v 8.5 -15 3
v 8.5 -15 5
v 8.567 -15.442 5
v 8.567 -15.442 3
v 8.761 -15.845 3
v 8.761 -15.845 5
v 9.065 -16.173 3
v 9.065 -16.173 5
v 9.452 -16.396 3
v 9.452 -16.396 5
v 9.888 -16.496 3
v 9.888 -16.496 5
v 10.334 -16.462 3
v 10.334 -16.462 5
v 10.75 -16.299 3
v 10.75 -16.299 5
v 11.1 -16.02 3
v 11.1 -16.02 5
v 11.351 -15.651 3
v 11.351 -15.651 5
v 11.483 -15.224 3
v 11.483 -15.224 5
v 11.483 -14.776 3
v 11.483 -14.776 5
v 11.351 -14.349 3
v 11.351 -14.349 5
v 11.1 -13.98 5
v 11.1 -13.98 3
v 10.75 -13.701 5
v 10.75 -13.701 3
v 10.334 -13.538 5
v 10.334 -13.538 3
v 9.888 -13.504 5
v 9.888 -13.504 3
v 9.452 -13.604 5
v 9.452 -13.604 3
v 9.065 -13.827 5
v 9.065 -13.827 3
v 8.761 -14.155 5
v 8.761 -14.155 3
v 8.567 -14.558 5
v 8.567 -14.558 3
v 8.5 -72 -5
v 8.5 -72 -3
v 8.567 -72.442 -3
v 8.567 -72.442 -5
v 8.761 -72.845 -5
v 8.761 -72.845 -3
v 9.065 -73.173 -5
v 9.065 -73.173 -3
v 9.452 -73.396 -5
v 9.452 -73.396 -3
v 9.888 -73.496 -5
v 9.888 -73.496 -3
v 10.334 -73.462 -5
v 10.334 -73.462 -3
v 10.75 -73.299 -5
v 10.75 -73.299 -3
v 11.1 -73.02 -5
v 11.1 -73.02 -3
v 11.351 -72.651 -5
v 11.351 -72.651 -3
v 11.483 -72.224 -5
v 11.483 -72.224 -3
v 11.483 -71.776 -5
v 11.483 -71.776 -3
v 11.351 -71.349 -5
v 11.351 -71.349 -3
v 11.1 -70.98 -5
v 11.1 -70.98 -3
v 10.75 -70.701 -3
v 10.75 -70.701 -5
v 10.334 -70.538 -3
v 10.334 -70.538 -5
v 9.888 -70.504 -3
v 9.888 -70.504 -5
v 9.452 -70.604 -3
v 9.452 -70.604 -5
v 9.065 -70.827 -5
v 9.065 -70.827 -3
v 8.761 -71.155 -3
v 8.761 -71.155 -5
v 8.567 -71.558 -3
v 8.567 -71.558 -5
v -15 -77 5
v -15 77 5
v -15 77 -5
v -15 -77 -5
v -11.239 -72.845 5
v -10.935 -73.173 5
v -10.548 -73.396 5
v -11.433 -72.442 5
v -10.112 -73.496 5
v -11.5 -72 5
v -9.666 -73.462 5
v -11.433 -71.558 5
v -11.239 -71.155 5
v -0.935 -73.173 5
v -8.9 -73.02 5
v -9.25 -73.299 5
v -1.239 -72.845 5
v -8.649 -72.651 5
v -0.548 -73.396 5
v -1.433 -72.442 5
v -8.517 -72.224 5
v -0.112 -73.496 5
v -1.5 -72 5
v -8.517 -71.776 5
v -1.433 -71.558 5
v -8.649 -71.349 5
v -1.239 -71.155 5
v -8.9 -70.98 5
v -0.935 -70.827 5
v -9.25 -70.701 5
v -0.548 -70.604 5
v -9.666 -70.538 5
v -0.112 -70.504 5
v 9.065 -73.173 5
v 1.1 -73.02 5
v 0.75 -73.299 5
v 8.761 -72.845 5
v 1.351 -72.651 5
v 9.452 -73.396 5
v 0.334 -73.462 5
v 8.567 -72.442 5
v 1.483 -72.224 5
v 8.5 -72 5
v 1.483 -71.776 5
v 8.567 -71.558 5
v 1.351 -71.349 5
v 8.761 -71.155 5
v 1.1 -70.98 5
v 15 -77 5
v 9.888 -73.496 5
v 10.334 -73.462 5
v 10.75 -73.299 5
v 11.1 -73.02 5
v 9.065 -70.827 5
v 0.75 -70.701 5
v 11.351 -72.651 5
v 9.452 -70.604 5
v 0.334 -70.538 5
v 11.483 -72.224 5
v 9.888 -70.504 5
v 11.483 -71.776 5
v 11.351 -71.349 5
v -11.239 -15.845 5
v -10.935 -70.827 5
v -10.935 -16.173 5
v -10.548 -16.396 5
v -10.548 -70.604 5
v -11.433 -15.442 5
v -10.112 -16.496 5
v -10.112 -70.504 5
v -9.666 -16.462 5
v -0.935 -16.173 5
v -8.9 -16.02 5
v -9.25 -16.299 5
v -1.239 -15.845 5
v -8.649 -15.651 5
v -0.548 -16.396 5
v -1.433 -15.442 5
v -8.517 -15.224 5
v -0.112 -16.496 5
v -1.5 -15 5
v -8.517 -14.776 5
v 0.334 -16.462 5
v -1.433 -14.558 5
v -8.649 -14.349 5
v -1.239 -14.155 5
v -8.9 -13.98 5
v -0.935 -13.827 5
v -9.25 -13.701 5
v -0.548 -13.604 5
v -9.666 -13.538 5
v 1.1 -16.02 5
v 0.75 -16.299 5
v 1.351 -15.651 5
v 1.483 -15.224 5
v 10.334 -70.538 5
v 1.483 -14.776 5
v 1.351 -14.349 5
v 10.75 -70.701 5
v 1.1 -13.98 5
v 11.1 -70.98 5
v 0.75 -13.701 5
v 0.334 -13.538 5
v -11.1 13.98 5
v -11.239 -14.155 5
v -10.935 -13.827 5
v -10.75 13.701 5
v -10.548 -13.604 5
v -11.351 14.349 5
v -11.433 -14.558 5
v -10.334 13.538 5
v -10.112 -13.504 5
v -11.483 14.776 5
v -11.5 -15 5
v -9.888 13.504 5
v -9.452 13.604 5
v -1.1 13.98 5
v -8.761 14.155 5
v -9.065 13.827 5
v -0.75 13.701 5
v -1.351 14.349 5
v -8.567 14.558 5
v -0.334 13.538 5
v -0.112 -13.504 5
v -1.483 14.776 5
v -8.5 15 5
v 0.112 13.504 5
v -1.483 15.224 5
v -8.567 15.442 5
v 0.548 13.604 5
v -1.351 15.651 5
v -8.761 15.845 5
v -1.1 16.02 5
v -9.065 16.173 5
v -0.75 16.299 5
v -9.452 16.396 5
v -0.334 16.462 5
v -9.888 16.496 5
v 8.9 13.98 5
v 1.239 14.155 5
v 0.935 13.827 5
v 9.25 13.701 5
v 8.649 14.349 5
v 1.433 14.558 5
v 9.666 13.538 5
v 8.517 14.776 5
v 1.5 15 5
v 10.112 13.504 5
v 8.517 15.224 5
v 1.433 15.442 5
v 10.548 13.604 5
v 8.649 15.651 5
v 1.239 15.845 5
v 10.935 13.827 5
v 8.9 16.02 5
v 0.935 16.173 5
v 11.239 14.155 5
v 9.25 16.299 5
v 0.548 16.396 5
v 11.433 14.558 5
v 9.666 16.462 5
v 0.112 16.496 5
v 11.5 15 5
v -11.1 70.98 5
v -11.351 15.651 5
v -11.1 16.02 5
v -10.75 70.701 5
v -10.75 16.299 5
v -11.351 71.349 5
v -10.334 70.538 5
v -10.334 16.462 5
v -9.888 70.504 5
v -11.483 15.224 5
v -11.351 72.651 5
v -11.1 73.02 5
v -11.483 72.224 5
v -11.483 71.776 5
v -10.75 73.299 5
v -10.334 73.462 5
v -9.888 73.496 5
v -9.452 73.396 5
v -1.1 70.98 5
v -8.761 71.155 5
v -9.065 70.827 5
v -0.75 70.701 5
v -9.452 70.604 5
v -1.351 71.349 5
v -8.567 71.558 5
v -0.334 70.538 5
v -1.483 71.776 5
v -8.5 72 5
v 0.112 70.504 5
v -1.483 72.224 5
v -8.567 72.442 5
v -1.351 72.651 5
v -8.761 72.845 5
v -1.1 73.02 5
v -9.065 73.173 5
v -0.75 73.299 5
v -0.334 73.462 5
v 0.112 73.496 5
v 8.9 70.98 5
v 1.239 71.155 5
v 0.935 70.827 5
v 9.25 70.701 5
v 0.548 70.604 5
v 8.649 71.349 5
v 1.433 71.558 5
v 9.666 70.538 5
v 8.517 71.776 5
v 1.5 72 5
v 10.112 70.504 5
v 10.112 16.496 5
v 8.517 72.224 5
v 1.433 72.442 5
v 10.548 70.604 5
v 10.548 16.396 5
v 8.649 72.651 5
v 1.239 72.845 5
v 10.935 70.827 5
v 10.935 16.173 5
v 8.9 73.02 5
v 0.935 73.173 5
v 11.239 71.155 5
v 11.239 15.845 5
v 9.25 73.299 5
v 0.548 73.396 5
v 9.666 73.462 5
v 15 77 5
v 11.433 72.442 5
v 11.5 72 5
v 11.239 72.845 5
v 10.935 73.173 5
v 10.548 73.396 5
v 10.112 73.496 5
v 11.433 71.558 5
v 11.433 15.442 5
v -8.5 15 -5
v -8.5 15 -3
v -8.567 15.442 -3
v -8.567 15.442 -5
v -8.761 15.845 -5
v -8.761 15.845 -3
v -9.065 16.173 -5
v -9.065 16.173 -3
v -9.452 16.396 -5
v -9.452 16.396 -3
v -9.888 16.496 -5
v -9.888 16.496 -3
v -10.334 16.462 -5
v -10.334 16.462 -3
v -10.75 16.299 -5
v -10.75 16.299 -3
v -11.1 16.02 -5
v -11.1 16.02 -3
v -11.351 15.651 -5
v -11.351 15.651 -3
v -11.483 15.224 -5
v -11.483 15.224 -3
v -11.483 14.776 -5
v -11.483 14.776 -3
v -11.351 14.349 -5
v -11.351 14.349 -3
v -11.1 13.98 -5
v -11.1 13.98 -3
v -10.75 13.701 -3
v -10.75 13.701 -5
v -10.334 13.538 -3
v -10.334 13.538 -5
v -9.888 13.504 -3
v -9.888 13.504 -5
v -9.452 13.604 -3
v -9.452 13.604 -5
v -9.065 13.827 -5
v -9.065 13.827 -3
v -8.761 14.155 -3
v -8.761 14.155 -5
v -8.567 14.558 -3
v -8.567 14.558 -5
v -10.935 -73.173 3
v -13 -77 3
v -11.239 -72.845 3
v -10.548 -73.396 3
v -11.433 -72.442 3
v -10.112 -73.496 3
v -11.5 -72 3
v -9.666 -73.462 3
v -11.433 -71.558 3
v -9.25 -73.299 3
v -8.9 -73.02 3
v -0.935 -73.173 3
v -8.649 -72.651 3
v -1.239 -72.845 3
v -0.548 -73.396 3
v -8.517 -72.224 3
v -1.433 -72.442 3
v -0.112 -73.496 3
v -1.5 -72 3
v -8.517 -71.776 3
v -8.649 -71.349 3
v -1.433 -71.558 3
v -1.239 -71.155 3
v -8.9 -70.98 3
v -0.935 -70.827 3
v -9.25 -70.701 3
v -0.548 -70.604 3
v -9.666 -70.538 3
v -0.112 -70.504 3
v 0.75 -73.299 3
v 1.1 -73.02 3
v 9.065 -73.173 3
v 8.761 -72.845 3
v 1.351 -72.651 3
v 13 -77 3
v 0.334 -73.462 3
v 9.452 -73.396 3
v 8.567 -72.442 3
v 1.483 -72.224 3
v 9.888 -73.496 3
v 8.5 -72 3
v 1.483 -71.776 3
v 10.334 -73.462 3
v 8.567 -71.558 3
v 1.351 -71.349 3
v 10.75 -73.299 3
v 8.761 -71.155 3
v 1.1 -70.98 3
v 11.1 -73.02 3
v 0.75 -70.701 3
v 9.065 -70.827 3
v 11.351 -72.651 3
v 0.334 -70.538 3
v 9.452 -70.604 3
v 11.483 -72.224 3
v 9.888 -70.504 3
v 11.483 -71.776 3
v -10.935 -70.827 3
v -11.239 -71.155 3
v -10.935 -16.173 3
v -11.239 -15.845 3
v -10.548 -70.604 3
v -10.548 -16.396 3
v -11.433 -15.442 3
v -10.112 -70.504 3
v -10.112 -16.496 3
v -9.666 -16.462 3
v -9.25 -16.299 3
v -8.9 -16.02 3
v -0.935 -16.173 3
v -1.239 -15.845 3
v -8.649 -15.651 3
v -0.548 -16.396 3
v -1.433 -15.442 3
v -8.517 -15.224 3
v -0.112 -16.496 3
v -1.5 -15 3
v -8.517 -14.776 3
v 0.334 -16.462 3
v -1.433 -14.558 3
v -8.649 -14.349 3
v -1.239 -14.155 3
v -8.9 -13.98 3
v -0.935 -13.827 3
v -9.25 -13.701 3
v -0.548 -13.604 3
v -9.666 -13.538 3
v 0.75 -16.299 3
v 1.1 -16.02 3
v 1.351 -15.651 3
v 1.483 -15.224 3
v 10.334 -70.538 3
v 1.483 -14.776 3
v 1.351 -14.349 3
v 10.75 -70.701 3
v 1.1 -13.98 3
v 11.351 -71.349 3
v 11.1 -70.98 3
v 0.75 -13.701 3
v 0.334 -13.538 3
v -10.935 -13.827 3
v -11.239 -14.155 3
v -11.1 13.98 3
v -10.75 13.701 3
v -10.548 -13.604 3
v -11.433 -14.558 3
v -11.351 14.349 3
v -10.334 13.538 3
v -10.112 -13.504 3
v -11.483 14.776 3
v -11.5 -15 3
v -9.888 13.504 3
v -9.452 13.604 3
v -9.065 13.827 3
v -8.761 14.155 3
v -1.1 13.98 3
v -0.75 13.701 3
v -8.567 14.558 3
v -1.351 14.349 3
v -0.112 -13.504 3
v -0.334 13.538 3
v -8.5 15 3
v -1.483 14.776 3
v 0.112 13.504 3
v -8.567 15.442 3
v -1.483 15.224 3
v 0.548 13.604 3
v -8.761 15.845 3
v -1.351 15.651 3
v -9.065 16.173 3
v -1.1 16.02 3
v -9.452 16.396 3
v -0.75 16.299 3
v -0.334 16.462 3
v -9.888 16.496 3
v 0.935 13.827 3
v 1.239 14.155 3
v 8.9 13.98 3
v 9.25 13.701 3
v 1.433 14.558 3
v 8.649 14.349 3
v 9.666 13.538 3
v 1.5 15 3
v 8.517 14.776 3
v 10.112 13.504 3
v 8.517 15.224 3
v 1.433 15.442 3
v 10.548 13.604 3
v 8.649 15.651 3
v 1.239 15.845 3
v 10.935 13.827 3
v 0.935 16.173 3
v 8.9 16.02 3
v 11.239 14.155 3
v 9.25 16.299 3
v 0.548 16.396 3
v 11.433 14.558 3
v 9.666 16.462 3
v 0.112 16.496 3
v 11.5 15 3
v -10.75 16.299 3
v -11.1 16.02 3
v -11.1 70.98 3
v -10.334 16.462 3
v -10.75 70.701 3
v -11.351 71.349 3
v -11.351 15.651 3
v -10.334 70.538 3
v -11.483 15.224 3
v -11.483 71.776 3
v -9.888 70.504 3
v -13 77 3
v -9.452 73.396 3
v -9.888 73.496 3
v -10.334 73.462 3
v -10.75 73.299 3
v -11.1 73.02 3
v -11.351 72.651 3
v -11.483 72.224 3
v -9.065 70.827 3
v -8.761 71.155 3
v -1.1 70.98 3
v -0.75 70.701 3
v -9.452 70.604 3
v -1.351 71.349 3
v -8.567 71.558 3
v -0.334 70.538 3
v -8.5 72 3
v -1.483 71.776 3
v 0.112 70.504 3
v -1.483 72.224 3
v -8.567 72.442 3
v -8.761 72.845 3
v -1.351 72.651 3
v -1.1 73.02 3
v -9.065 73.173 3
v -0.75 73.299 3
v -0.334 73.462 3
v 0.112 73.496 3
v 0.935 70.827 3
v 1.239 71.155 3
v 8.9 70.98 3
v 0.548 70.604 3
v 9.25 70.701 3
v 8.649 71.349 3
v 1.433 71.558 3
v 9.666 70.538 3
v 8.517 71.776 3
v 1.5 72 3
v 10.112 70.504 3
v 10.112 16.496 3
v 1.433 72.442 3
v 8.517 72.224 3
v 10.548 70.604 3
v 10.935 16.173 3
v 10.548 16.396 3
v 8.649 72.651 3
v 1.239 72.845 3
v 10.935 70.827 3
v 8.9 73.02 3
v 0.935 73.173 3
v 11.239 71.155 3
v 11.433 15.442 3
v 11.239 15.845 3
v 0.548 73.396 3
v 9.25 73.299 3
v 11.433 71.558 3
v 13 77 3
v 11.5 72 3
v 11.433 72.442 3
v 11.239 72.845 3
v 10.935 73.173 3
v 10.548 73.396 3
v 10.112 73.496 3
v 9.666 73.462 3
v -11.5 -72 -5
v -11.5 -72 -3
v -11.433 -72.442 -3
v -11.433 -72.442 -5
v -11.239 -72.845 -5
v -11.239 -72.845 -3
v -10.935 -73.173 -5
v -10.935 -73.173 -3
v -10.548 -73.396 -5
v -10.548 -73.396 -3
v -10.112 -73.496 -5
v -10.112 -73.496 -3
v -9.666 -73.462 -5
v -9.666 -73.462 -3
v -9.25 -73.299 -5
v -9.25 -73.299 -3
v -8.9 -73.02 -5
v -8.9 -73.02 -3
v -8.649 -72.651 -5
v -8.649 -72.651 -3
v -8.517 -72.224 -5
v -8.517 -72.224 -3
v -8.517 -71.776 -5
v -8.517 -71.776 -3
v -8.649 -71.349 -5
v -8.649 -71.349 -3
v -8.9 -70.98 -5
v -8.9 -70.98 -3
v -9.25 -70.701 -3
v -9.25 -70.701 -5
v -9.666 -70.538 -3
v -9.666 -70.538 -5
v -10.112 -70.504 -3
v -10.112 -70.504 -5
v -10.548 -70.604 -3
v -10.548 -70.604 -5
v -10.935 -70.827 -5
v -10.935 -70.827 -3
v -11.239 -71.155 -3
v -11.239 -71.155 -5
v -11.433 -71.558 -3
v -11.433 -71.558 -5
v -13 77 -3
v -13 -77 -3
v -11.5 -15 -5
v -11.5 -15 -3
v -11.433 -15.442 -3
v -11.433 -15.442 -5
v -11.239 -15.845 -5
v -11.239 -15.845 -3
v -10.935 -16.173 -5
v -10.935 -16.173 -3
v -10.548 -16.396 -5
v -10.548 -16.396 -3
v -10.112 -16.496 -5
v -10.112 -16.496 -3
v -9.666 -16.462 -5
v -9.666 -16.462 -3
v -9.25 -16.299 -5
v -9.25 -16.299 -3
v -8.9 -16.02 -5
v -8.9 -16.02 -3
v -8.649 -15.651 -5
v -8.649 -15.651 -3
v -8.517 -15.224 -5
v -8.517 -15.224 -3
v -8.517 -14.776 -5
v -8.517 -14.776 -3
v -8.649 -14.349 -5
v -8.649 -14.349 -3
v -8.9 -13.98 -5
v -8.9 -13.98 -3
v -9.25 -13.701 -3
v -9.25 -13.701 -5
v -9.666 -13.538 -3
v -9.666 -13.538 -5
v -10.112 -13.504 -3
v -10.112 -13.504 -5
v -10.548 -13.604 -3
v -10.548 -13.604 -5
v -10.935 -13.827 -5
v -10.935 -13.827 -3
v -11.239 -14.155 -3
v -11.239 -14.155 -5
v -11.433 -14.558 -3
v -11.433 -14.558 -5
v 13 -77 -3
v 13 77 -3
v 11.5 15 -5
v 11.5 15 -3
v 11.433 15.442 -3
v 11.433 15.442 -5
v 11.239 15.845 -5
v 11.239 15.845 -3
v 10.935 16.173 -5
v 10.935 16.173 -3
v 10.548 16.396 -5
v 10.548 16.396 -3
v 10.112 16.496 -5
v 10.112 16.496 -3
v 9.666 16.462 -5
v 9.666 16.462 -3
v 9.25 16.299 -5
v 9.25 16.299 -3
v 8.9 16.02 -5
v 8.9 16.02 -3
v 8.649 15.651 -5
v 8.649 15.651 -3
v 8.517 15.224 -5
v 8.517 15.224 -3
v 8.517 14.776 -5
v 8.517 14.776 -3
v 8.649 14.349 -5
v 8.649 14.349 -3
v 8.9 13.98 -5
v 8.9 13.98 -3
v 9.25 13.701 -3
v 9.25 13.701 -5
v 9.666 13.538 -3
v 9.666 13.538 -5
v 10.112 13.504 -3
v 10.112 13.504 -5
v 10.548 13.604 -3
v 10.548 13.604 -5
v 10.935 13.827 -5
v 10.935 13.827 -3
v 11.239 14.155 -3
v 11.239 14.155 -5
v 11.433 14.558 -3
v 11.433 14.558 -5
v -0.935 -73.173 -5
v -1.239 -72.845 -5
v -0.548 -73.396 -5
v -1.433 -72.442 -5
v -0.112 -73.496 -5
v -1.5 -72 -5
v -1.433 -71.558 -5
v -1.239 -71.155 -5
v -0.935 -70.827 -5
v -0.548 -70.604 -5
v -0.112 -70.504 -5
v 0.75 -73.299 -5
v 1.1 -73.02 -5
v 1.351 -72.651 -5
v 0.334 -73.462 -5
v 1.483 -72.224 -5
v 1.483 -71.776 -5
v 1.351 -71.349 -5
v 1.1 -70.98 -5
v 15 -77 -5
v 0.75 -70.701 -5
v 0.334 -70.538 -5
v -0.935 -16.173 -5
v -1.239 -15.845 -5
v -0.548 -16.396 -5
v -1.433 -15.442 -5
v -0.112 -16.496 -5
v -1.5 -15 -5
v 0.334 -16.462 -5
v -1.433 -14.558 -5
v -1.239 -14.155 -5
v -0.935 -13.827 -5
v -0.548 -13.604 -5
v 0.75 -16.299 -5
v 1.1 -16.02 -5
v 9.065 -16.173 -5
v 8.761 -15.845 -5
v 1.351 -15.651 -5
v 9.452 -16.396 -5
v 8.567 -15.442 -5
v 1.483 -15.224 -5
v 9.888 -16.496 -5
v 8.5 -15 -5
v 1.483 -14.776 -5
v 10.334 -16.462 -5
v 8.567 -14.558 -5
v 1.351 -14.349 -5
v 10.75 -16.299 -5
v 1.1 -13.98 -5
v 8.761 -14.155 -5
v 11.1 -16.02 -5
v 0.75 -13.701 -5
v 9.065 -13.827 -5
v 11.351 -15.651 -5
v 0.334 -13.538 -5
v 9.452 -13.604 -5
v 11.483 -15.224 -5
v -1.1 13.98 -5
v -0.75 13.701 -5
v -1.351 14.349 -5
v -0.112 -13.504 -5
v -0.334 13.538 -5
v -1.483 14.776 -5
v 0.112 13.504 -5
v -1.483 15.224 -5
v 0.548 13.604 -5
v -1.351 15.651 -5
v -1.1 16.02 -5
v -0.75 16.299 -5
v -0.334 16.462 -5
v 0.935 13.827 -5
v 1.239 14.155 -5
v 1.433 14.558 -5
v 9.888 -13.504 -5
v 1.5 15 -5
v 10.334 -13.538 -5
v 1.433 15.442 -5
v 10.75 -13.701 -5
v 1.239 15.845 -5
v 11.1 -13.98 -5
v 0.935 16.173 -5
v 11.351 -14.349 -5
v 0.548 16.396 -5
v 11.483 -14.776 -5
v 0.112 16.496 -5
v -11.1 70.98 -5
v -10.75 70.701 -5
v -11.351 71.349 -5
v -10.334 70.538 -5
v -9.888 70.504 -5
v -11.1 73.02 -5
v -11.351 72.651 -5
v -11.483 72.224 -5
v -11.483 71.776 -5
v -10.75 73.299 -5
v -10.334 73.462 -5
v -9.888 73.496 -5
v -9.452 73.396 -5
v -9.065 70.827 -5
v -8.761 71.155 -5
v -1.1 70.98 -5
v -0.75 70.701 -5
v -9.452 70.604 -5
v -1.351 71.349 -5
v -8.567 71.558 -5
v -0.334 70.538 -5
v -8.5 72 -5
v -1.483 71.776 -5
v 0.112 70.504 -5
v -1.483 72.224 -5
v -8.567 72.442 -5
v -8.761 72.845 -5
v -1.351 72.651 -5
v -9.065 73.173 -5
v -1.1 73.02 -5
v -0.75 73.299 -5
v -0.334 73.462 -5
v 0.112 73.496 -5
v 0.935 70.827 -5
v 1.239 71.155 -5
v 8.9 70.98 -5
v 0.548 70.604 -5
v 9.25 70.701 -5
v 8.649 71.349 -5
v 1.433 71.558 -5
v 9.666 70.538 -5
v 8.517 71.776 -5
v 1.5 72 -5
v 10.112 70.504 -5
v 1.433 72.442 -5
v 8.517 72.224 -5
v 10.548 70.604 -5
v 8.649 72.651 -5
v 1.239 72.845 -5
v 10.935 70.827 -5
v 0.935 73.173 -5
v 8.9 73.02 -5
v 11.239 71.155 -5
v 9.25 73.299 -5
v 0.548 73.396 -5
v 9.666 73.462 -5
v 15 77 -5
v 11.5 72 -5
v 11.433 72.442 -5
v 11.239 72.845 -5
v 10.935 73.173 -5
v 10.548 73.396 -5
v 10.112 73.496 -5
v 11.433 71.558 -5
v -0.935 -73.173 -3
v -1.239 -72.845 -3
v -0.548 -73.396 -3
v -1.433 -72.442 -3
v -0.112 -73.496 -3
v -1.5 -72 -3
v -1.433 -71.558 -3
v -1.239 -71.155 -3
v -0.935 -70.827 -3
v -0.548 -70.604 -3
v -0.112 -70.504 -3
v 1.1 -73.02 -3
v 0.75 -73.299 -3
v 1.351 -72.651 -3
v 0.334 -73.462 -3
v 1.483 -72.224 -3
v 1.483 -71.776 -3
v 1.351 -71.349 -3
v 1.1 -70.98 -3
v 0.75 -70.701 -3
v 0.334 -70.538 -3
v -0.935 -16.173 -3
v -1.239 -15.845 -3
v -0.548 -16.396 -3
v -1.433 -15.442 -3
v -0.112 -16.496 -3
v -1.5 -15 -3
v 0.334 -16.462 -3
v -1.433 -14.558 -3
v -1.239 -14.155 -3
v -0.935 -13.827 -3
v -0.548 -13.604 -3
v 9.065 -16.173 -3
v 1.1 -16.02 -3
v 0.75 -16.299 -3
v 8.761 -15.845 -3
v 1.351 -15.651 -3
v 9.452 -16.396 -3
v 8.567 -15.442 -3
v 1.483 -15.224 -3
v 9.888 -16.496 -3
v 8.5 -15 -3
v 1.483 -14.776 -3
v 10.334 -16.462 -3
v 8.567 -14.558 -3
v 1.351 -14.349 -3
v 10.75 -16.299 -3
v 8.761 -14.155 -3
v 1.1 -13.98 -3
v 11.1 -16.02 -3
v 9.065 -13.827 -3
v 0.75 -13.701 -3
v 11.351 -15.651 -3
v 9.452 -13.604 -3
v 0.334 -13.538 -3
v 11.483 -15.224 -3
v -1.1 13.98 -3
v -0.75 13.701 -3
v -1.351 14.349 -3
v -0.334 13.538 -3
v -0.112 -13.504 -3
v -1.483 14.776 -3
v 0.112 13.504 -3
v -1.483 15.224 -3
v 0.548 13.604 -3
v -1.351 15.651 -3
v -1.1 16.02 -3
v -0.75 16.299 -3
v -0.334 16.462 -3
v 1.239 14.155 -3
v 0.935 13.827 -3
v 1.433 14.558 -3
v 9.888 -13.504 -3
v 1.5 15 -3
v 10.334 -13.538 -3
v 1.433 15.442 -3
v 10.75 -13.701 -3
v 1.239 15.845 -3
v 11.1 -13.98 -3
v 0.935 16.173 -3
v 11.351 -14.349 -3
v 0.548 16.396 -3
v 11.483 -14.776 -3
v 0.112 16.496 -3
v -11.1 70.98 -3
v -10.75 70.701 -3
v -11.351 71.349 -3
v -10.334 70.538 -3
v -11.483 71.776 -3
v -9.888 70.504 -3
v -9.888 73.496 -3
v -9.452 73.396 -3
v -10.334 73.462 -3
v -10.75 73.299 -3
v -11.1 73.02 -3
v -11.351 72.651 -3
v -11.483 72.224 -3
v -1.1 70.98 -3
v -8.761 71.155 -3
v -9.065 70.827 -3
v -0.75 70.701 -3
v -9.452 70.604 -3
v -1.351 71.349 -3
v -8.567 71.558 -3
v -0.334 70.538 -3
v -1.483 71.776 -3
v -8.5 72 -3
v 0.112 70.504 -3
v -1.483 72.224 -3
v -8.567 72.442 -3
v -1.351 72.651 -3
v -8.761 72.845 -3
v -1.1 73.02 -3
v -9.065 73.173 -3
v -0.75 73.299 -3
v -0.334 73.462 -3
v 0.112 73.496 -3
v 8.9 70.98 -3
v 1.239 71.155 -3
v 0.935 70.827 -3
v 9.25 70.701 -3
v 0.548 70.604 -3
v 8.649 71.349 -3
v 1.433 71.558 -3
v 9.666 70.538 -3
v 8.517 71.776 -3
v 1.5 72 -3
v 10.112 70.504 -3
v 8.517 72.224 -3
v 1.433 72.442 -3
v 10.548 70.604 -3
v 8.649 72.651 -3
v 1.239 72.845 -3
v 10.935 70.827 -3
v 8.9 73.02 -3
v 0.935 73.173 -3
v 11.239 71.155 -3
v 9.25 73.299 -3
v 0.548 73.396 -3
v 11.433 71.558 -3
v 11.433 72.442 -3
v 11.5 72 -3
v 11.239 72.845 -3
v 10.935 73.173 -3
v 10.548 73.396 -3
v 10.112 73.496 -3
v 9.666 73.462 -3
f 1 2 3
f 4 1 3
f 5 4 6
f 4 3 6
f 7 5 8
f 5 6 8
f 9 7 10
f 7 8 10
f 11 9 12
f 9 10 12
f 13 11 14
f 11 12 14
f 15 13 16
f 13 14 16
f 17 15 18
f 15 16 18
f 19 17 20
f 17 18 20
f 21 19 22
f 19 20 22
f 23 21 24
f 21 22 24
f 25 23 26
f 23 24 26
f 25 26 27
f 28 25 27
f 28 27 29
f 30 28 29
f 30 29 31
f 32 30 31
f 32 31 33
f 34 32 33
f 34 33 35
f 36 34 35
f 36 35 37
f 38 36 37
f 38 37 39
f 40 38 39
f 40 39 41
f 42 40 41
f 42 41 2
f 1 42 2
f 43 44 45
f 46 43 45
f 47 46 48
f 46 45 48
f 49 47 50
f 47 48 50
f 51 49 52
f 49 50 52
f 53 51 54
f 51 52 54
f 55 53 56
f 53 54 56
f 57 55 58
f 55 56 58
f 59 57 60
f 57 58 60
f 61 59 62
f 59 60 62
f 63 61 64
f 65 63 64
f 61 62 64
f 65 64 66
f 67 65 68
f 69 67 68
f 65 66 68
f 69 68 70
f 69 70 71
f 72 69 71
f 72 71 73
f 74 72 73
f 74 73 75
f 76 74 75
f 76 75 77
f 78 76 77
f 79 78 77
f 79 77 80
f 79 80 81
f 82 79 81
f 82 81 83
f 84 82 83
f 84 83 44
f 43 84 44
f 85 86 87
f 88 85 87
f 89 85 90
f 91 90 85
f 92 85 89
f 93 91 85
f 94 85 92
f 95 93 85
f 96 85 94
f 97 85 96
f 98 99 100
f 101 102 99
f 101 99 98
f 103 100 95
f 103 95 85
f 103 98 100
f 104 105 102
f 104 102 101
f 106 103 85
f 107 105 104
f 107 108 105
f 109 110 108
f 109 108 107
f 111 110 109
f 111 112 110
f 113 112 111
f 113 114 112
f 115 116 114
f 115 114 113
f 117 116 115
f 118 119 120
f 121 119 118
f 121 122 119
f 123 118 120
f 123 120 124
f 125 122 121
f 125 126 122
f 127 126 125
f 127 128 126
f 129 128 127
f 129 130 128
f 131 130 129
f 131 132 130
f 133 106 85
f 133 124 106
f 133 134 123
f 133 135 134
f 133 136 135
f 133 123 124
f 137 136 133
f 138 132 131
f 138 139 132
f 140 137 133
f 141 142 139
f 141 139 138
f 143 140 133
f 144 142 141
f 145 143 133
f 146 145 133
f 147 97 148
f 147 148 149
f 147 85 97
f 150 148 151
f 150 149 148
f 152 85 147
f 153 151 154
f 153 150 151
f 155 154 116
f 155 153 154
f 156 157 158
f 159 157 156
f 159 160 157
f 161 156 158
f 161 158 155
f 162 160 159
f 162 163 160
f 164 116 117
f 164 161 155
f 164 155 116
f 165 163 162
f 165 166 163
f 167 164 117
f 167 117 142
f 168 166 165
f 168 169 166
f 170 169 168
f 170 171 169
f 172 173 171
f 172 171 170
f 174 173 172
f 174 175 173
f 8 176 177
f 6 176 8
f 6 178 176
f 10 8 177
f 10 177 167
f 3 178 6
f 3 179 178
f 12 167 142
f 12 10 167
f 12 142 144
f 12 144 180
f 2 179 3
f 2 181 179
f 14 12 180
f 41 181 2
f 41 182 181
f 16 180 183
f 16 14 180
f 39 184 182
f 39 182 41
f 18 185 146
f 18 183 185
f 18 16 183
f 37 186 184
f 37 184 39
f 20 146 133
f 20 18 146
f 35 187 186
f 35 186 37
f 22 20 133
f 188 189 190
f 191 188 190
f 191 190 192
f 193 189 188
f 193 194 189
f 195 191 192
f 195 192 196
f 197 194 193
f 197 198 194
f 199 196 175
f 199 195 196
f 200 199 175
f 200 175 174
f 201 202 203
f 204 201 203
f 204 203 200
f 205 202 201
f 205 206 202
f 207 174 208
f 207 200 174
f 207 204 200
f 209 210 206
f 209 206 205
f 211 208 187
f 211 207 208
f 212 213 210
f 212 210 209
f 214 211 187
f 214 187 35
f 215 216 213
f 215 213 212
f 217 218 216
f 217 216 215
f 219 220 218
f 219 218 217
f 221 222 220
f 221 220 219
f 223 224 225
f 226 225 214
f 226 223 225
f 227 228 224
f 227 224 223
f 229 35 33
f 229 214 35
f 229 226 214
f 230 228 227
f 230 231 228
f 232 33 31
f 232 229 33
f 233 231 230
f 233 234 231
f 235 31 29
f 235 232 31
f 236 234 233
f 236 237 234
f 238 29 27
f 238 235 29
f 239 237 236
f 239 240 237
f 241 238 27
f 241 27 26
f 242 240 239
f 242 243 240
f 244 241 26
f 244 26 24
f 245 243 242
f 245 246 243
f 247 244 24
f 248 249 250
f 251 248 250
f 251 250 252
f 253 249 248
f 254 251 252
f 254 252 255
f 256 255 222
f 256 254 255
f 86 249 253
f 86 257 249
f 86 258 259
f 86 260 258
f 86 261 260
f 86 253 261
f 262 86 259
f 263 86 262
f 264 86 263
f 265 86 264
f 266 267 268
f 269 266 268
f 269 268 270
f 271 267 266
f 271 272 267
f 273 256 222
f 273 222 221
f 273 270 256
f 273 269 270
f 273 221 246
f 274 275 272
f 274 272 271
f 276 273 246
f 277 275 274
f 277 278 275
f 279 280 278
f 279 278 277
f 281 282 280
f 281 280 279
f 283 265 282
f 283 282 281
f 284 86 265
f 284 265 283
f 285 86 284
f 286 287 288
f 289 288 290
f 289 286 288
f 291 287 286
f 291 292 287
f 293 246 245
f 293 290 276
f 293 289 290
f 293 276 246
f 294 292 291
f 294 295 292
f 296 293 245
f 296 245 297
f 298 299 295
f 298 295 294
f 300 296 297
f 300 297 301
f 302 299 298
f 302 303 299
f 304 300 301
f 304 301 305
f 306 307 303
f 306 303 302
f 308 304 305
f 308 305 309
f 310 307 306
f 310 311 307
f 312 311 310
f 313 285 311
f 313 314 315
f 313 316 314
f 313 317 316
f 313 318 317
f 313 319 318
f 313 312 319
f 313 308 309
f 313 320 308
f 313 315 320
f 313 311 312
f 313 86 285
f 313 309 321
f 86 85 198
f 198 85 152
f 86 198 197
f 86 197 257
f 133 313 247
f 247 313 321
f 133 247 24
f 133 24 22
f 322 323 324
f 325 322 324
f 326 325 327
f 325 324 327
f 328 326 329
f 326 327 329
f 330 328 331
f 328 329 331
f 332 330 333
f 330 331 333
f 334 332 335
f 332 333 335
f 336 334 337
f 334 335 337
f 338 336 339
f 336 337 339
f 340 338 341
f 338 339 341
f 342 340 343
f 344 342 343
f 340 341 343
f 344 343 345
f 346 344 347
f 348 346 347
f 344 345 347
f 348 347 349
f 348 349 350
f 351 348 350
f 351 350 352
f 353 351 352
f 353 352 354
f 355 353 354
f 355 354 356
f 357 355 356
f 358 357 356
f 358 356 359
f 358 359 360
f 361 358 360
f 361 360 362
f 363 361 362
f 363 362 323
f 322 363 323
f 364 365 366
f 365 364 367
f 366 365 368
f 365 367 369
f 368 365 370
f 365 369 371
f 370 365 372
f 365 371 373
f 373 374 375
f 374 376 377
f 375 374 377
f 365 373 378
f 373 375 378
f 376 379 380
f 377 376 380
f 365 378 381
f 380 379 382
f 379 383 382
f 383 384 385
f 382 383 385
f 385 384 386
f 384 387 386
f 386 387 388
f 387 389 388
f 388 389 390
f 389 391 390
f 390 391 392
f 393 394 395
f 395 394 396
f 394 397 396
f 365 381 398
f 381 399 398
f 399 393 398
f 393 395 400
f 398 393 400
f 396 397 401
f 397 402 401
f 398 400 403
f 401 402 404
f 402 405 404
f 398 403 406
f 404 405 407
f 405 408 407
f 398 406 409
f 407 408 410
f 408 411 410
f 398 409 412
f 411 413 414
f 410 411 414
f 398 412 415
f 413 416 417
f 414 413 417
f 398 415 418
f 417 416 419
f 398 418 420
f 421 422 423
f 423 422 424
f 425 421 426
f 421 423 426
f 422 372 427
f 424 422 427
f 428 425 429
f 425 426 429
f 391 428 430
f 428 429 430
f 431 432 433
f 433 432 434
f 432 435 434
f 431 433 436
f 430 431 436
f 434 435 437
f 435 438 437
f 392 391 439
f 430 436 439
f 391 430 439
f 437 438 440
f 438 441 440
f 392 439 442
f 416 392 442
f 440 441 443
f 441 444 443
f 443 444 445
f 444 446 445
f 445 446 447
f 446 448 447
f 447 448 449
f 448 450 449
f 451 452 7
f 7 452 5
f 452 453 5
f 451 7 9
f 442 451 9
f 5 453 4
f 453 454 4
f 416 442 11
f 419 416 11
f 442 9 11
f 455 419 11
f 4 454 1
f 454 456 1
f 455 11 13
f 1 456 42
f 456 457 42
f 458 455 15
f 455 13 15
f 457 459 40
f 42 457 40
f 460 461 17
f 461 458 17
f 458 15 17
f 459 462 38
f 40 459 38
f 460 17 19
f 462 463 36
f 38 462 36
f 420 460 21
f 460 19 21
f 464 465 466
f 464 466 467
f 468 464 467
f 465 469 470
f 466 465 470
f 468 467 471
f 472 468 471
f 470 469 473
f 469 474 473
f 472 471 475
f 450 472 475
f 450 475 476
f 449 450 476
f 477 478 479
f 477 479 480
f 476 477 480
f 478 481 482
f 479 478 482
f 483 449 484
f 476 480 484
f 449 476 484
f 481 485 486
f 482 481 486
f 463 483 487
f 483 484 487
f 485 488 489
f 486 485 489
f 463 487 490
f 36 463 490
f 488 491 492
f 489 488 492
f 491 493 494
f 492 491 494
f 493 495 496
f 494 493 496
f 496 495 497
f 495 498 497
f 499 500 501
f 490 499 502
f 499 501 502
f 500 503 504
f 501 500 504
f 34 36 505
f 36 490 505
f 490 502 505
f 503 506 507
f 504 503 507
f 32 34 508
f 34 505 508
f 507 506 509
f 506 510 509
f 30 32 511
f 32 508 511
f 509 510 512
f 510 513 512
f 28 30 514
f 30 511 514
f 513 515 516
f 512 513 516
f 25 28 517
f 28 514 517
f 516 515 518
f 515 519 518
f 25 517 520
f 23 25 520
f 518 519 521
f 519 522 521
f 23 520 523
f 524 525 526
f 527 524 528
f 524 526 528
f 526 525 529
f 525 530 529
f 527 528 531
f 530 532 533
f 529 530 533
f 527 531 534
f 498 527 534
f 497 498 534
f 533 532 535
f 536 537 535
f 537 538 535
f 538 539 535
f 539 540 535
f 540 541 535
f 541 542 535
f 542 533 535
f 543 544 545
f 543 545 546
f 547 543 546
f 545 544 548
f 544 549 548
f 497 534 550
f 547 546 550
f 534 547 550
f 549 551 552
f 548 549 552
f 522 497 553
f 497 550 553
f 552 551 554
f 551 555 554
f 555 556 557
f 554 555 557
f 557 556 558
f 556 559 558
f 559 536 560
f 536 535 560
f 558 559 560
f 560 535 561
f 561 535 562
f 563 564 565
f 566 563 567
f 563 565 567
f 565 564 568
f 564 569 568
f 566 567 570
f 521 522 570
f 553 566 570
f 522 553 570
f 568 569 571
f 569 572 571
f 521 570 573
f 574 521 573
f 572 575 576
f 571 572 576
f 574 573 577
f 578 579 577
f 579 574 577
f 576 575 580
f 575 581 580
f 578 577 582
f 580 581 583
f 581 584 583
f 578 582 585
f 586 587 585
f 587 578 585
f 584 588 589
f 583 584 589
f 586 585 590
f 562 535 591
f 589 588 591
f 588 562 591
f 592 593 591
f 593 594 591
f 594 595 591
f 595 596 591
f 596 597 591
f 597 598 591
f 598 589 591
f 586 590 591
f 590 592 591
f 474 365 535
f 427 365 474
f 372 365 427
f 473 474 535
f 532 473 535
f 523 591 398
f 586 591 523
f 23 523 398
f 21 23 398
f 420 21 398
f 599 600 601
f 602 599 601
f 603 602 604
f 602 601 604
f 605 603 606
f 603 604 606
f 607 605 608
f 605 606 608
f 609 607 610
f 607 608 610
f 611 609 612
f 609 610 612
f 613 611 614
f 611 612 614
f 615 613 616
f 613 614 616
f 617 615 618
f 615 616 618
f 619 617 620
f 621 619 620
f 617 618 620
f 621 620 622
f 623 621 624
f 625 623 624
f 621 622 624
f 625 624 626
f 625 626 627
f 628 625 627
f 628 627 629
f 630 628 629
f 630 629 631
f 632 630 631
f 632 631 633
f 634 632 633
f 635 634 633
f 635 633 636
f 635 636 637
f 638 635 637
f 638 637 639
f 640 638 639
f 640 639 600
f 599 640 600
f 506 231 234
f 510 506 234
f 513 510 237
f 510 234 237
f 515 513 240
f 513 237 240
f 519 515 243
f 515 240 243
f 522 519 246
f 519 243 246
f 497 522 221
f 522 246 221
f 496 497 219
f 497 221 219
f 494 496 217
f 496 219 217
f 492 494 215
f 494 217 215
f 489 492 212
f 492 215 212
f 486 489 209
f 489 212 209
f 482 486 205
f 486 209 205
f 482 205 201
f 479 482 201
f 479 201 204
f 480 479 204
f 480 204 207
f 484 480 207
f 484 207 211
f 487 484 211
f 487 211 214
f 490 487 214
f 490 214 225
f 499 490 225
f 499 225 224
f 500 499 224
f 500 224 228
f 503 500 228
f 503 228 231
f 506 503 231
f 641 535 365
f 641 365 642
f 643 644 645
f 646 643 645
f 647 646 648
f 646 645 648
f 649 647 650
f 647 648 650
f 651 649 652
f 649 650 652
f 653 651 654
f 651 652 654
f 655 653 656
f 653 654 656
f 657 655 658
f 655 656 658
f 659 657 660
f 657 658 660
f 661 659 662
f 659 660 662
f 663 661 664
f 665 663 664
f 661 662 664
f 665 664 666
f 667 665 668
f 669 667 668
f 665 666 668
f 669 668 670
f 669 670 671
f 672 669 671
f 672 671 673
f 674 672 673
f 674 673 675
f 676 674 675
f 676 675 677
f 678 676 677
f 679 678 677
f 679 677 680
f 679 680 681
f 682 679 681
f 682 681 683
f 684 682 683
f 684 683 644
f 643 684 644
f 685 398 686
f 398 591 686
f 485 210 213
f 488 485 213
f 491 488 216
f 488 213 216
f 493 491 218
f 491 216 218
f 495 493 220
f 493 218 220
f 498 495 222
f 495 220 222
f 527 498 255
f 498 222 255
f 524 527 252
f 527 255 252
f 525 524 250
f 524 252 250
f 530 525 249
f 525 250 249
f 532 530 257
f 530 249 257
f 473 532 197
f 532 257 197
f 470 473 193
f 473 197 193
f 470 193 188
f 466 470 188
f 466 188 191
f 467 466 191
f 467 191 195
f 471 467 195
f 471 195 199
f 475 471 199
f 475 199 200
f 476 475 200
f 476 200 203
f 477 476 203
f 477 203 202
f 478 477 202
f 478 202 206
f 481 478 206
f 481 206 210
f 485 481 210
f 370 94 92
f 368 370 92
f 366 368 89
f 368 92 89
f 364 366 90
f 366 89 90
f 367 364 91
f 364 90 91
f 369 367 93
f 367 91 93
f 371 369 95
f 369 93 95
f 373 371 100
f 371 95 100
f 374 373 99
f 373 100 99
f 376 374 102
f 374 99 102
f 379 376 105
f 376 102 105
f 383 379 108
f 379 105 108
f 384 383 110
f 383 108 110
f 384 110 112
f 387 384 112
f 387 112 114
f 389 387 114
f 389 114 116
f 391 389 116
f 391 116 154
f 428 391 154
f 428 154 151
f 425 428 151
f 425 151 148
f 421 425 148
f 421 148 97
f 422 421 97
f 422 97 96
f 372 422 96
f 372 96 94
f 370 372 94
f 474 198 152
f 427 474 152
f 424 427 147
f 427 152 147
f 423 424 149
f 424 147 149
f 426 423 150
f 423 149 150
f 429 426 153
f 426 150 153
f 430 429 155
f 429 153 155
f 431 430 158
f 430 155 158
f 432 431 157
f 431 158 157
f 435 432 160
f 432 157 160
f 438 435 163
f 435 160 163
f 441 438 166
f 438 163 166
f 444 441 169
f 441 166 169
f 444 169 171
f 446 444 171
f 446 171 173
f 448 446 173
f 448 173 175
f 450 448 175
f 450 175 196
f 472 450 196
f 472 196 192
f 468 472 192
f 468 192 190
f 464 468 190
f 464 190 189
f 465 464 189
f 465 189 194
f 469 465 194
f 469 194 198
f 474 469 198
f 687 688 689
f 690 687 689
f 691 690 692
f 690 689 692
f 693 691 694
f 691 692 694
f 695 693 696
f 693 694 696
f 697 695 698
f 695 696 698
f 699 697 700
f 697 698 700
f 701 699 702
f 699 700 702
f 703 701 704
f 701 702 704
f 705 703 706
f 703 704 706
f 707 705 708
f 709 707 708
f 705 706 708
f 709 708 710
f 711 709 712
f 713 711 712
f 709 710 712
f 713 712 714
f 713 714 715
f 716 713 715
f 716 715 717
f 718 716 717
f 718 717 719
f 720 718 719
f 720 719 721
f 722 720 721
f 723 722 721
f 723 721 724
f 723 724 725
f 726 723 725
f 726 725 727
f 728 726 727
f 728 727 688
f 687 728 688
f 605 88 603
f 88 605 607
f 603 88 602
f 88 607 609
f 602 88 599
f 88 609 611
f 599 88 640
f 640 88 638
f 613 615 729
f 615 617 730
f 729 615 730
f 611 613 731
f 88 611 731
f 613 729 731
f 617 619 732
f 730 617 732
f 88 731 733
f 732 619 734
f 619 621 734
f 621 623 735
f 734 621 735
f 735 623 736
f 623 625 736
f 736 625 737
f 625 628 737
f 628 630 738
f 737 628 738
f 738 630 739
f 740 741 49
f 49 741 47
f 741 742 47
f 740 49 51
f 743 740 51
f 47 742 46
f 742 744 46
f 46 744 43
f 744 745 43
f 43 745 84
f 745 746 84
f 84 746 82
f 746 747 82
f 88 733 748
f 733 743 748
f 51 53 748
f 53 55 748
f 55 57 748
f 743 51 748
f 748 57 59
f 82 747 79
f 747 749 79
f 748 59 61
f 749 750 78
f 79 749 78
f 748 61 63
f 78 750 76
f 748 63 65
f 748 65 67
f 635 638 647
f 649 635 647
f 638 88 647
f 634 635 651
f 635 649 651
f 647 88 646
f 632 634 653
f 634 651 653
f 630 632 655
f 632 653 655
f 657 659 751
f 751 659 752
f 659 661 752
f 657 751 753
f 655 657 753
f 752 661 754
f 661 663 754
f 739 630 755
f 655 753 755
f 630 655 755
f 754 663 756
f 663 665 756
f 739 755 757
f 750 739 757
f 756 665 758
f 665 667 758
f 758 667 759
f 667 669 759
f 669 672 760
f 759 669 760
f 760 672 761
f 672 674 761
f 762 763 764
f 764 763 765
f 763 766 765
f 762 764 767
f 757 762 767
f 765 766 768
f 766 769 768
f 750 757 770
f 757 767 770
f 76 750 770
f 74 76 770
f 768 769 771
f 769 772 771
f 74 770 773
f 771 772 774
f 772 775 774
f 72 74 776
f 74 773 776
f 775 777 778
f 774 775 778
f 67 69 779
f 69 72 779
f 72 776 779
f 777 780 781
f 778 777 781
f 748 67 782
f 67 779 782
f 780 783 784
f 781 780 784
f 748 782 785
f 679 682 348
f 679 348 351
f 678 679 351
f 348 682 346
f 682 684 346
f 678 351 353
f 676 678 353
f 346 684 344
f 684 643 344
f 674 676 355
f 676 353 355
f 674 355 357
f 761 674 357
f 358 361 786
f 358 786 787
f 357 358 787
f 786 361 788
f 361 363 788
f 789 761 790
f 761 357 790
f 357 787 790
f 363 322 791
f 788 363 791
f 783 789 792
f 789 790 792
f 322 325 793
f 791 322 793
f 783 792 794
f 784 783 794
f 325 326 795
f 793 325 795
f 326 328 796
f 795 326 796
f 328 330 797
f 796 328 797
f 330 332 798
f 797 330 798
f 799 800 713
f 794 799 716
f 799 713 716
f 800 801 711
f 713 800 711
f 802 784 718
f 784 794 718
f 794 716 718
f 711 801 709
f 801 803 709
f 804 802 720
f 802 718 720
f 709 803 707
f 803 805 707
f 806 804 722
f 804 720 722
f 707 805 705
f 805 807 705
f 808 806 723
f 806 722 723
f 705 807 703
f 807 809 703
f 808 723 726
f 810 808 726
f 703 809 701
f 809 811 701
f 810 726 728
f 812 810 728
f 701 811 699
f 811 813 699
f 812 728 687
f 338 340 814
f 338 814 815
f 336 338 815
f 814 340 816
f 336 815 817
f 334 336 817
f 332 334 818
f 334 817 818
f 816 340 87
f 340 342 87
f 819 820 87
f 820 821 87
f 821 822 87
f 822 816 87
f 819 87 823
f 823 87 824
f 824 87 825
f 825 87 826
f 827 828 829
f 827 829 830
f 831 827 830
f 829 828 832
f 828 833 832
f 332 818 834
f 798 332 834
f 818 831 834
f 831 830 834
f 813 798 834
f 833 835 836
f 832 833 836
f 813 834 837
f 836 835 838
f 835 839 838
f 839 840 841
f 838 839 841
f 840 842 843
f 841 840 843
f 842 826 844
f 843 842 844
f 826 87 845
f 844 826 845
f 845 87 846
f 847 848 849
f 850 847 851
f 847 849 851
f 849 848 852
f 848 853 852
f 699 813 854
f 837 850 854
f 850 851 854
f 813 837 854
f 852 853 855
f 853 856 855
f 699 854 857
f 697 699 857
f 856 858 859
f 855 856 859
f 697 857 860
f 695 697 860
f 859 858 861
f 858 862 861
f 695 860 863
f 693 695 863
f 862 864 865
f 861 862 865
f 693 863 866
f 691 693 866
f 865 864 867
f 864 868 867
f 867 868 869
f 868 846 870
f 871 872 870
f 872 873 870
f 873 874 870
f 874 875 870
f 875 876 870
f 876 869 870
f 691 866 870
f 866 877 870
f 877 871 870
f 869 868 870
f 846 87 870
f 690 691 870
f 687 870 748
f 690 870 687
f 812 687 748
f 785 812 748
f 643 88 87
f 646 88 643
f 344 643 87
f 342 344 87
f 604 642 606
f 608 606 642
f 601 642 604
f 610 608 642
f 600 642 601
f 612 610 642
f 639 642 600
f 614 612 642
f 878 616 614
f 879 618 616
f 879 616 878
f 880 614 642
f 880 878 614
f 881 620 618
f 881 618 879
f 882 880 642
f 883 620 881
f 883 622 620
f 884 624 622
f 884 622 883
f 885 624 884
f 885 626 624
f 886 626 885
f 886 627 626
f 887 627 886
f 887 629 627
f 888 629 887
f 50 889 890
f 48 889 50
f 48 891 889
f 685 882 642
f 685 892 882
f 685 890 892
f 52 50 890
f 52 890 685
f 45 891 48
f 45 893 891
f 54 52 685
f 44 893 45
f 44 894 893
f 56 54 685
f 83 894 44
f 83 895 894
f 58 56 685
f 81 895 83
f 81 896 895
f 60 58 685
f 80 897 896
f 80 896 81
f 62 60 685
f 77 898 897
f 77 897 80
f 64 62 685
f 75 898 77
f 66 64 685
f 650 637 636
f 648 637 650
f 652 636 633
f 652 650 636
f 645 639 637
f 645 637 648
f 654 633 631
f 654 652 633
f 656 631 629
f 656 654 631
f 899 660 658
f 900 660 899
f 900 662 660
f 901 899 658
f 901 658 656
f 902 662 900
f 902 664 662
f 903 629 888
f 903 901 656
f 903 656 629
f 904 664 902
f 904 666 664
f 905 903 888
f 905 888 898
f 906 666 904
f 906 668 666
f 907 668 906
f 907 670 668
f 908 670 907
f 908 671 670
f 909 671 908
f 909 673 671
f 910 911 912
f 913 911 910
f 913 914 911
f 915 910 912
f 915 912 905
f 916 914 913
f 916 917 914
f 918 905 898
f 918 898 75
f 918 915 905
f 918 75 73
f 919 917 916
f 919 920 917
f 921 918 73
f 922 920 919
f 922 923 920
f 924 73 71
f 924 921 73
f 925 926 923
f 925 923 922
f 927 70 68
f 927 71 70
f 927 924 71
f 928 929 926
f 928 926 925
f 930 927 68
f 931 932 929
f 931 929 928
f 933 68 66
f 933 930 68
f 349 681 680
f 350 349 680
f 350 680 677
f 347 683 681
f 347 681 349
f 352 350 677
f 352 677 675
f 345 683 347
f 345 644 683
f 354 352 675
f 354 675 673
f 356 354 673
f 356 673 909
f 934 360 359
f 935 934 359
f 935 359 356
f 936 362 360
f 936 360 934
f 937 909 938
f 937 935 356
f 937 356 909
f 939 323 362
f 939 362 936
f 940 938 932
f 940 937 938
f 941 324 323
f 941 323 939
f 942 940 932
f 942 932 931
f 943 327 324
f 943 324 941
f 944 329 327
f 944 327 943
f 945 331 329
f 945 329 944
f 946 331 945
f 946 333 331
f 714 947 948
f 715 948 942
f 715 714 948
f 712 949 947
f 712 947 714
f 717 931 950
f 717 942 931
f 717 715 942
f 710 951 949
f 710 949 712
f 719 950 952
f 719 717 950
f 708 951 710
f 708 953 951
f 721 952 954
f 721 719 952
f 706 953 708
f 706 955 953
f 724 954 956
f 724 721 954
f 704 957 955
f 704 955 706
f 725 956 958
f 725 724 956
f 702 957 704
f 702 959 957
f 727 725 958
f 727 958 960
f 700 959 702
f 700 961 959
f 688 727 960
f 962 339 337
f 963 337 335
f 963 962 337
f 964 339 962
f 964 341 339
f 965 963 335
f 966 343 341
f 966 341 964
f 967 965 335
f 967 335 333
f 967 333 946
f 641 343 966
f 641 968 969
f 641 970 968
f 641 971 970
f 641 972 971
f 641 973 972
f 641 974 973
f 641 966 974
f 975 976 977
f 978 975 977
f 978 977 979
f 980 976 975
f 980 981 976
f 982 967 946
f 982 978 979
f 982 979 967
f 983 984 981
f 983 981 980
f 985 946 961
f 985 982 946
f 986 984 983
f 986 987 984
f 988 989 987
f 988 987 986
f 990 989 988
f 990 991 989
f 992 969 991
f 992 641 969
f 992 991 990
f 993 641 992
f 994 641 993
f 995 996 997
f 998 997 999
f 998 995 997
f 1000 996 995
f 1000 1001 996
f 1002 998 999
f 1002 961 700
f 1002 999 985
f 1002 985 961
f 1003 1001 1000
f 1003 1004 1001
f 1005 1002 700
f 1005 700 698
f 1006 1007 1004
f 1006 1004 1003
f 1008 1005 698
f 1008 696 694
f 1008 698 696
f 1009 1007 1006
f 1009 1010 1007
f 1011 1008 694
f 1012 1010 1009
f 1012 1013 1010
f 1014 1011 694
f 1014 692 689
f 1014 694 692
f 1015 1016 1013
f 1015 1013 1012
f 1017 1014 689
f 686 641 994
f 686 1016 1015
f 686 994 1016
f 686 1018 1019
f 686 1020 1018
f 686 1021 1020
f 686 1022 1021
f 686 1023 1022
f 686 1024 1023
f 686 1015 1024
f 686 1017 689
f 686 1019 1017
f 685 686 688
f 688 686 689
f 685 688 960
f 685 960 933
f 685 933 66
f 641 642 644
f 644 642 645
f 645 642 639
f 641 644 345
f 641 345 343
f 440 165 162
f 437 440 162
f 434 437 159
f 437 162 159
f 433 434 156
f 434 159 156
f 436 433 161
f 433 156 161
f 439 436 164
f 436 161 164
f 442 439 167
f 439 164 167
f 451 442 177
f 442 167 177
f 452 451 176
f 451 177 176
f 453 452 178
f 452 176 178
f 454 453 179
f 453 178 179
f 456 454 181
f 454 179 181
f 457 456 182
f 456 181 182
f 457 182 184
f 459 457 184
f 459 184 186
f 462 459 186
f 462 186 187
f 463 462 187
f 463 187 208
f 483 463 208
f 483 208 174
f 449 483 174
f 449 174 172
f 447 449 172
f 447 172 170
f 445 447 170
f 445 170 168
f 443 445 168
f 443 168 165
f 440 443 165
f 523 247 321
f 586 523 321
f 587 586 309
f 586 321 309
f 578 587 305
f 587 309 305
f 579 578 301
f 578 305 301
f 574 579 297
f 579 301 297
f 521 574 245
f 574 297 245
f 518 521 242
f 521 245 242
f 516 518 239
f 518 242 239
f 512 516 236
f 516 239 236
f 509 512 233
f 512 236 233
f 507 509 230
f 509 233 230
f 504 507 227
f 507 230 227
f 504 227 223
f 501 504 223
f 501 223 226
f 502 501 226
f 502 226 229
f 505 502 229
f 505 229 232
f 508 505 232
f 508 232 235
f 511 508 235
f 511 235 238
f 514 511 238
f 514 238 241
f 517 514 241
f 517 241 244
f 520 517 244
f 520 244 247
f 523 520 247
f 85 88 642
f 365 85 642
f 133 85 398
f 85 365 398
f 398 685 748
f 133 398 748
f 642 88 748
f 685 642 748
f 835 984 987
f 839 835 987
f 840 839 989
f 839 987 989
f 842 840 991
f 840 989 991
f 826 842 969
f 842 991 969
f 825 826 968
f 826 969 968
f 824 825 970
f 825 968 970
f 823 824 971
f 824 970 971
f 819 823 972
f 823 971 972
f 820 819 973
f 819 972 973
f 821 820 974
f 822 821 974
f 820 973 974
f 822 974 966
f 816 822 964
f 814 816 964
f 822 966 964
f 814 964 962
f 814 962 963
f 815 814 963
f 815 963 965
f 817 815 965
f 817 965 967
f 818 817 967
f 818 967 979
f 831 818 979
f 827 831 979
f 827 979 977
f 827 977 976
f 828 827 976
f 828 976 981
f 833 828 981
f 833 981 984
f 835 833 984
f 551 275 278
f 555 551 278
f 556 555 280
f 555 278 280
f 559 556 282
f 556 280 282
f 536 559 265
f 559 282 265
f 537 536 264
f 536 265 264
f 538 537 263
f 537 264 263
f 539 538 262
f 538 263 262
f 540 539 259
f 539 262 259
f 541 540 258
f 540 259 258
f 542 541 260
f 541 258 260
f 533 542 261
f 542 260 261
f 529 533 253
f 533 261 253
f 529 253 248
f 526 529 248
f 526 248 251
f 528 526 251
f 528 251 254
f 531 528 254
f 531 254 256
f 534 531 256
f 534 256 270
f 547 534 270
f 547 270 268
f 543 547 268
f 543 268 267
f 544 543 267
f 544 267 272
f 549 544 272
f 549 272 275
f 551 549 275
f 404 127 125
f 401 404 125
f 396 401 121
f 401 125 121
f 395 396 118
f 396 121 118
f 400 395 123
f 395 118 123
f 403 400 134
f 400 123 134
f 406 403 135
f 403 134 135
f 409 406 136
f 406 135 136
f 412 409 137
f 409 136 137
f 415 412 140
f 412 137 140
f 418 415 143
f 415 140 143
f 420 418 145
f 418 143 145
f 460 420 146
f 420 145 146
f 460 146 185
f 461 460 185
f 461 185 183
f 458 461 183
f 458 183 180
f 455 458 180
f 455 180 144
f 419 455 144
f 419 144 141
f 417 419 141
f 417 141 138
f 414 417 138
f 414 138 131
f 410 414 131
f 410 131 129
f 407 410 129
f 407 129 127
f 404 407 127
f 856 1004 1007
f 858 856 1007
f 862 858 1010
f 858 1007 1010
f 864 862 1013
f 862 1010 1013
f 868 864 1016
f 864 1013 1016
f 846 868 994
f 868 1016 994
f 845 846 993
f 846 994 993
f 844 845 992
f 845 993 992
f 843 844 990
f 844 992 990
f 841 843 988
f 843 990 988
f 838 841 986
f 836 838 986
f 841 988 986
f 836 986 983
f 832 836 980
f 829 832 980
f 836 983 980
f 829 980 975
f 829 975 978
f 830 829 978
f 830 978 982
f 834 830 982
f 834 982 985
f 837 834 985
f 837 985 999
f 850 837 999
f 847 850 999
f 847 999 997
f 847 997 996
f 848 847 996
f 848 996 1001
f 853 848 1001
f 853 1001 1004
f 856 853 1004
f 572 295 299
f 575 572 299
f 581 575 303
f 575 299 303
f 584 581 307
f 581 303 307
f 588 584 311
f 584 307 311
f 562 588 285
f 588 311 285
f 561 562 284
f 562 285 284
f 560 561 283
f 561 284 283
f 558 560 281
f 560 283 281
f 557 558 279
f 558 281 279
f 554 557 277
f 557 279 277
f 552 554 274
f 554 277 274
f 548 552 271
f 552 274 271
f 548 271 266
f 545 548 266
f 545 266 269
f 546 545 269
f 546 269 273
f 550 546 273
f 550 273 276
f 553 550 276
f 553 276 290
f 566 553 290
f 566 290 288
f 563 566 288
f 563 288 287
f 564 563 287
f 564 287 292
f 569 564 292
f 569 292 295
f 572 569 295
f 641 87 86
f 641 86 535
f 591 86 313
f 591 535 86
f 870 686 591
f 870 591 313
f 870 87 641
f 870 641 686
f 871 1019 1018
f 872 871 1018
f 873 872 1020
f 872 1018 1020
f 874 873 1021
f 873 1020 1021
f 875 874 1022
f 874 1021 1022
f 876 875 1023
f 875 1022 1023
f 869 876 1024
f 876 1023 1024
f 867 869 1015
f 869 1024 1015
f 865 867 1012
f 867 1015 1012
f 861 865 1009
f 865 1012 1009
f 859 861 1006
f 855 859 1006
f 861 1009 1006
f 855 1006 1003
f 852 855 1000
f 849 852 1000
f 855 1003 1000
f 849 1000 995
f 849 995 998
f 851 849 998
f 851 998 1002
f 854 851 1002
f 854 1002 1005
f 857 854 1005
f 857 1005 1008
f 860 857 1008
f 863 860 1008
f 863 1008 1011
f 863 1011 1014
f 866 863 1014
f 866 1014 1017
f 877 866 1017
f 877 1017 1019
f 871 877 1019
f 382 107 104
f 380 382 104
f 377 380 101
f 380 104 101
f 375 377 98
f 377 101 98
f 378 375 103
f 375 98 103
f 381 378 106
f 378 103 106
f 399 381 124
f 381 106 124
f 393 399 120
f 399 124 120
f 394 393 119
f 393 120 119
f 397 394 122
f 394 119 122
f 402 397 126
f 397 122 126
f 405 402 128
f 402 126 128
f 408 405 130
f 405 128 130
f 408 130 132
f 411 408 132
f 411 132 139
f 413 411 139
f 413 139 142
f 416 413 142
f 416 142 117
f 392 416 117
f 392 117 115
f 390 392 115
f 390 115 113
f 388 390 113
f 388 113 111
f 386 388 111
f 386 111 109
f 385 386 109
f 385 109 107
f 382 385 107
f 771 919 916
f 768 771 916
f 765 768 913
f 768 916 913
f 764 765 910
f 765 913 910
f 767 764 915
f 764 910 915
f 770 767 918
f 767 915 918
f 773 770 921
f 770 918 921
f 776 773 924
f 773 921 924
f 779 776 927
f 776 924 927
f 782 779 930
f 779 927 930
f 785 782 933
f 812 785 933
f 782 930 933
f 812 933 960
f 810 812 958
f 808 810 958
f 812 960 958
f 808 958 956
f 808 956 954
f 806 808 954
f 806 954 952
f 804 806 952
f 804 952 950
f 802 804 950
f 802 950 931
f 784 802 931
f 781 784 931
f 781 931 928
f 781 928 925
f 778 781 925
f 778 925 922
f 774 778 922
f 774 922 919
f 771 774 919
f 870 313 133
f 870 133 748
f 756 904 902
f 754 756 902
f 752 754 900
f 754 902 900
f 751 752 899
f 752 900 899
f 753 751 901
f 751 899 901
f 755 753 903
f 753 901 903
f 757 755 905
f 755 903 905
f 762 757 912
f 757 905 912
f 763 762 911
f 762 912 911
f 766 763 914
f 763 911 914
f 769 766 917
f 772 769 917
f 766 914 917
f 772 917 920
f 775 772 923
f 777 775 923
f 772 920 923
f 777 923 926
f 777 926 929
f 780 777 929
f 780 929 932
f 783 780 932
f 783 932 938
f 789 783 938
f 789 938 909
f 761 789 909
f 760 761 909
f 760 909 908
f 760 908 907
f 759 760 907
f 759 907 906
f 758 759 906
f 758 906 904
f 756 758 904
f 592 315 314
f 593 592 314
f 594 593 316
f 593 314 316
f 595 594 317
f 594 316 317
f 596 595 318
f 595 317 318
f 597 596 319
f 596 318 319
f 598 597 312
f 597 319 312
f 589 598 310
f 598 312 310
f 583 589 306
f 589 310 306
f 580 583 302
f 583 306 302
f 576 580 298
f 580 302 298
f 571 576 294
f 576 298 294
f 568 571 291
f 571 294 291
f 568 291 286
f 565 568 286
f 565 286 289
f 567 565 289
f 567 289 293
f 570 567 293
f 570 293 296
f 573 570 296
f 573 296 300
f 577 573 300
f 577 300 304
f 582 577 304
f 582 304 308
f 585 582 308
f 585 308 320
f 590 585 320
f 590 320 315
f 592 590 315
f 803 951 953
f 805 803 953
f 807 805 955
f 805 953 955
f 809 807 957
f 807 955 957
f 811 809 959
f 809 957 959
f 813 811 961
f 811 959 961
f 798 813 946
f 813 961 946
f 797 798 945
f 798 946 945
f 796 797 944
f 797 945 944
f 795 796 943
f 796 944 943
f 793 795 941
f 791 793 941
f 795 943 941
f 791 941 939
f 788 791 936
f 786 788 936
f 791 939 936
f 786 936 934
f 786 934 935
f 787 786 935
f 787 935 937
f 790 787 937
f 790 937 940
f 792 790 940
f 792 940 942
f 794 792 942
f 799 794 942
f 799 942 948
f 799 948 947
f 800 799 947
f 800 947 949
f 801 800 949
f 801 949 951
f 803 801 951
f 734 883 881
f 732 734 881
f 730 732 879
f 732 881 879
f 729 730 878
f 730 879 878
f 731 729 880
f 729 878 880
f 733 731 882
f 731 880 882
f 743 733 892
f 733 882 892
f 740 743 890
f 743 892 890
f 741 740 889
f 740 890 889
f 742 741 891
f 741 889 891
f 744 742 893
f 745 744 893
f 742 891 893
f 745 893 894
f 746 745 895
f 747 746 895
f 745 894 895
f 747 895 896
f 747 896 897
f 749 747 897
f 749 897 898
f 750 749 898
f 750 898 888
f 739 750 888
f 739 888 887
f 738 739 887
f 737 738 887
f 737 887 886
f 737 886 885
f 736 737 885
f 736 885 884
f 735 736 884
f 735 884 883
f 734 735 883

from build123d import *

# Parameters (mm, degrees)
SKETCH_1_W          = 30
SKETCH_1_H          = 10
SKETCH_1_W_2        = 26
SKETCH_1_H_2        = 6
EXTRUDE_1_DEPTH     = 77
SKETCH_2_R          = 1.5
CUT_EXTRUDE_1_DEPTH = 80.082235679


with BuildPart() as part:
    # 草图1 → 凸台-拉伸1 (new, symmetric)
    with BuildSketch(Plane(origin=(0, 0, 0), x_dir=(1, 0, 0), z_dir=(0, 1, 0))):
        Rectangle(SKETCH_1_W, SKETCH_1_H)
        Rectangle(SKETCH_1_W_2, SKETCH_1_H_2, mode=Mode.SUBTRACT)
    extrude(amount=EXTRUDE_1_DEPTH, both=True)

    # 草图2 → 切除-拉伸1 (cut, through all)
    with BuildSketch(Plane.XY.offset(5)):
        with Locations((10, 15)):
            Circle(SKETCH_2_R)
        with Locations((-10, 15)):
            Circle(SKETCH_2_R)
        with Locations((0, 15)):
            Circle(SKETCH_2_R)
        with Locations(Location((10, -15, 0), (0, 0, 180))):
            Circle(SKETCH_2_R)
        with Locations(Location((0, -15, 0), (0, 0, 180))):
            Circle(SKETCH_2_R)
        with Locations(Location((-10, -15, 0), (0, 0, 180))):
            Circle(SKETCH_2_R)
        with Locations((10, 72)):
            Circle(SKETCH_2_R)
        with Locations((-10, 72)):
            Circle(SKETCH_2_R)
        with Locations((0, 72)):
            Circle(SKETCH_2_R)
        with Locations(Location((-10, -72, 0), (0, 0, 180))):
            Circle(SKETCH_2_R)
        with Locations(Location((0, -72, 0), (0, 0, 180))):
            Circle(SKETCH_2_R)
        with Locations(Location((10, -72, 0), (0, 0, 180))):
            Circle(SKETCH_2_R)
    extrude(amount=-CUT_EXTRUDE_1_DEPTH, mode=Mode.SUBTRACT)


solid = part.part
